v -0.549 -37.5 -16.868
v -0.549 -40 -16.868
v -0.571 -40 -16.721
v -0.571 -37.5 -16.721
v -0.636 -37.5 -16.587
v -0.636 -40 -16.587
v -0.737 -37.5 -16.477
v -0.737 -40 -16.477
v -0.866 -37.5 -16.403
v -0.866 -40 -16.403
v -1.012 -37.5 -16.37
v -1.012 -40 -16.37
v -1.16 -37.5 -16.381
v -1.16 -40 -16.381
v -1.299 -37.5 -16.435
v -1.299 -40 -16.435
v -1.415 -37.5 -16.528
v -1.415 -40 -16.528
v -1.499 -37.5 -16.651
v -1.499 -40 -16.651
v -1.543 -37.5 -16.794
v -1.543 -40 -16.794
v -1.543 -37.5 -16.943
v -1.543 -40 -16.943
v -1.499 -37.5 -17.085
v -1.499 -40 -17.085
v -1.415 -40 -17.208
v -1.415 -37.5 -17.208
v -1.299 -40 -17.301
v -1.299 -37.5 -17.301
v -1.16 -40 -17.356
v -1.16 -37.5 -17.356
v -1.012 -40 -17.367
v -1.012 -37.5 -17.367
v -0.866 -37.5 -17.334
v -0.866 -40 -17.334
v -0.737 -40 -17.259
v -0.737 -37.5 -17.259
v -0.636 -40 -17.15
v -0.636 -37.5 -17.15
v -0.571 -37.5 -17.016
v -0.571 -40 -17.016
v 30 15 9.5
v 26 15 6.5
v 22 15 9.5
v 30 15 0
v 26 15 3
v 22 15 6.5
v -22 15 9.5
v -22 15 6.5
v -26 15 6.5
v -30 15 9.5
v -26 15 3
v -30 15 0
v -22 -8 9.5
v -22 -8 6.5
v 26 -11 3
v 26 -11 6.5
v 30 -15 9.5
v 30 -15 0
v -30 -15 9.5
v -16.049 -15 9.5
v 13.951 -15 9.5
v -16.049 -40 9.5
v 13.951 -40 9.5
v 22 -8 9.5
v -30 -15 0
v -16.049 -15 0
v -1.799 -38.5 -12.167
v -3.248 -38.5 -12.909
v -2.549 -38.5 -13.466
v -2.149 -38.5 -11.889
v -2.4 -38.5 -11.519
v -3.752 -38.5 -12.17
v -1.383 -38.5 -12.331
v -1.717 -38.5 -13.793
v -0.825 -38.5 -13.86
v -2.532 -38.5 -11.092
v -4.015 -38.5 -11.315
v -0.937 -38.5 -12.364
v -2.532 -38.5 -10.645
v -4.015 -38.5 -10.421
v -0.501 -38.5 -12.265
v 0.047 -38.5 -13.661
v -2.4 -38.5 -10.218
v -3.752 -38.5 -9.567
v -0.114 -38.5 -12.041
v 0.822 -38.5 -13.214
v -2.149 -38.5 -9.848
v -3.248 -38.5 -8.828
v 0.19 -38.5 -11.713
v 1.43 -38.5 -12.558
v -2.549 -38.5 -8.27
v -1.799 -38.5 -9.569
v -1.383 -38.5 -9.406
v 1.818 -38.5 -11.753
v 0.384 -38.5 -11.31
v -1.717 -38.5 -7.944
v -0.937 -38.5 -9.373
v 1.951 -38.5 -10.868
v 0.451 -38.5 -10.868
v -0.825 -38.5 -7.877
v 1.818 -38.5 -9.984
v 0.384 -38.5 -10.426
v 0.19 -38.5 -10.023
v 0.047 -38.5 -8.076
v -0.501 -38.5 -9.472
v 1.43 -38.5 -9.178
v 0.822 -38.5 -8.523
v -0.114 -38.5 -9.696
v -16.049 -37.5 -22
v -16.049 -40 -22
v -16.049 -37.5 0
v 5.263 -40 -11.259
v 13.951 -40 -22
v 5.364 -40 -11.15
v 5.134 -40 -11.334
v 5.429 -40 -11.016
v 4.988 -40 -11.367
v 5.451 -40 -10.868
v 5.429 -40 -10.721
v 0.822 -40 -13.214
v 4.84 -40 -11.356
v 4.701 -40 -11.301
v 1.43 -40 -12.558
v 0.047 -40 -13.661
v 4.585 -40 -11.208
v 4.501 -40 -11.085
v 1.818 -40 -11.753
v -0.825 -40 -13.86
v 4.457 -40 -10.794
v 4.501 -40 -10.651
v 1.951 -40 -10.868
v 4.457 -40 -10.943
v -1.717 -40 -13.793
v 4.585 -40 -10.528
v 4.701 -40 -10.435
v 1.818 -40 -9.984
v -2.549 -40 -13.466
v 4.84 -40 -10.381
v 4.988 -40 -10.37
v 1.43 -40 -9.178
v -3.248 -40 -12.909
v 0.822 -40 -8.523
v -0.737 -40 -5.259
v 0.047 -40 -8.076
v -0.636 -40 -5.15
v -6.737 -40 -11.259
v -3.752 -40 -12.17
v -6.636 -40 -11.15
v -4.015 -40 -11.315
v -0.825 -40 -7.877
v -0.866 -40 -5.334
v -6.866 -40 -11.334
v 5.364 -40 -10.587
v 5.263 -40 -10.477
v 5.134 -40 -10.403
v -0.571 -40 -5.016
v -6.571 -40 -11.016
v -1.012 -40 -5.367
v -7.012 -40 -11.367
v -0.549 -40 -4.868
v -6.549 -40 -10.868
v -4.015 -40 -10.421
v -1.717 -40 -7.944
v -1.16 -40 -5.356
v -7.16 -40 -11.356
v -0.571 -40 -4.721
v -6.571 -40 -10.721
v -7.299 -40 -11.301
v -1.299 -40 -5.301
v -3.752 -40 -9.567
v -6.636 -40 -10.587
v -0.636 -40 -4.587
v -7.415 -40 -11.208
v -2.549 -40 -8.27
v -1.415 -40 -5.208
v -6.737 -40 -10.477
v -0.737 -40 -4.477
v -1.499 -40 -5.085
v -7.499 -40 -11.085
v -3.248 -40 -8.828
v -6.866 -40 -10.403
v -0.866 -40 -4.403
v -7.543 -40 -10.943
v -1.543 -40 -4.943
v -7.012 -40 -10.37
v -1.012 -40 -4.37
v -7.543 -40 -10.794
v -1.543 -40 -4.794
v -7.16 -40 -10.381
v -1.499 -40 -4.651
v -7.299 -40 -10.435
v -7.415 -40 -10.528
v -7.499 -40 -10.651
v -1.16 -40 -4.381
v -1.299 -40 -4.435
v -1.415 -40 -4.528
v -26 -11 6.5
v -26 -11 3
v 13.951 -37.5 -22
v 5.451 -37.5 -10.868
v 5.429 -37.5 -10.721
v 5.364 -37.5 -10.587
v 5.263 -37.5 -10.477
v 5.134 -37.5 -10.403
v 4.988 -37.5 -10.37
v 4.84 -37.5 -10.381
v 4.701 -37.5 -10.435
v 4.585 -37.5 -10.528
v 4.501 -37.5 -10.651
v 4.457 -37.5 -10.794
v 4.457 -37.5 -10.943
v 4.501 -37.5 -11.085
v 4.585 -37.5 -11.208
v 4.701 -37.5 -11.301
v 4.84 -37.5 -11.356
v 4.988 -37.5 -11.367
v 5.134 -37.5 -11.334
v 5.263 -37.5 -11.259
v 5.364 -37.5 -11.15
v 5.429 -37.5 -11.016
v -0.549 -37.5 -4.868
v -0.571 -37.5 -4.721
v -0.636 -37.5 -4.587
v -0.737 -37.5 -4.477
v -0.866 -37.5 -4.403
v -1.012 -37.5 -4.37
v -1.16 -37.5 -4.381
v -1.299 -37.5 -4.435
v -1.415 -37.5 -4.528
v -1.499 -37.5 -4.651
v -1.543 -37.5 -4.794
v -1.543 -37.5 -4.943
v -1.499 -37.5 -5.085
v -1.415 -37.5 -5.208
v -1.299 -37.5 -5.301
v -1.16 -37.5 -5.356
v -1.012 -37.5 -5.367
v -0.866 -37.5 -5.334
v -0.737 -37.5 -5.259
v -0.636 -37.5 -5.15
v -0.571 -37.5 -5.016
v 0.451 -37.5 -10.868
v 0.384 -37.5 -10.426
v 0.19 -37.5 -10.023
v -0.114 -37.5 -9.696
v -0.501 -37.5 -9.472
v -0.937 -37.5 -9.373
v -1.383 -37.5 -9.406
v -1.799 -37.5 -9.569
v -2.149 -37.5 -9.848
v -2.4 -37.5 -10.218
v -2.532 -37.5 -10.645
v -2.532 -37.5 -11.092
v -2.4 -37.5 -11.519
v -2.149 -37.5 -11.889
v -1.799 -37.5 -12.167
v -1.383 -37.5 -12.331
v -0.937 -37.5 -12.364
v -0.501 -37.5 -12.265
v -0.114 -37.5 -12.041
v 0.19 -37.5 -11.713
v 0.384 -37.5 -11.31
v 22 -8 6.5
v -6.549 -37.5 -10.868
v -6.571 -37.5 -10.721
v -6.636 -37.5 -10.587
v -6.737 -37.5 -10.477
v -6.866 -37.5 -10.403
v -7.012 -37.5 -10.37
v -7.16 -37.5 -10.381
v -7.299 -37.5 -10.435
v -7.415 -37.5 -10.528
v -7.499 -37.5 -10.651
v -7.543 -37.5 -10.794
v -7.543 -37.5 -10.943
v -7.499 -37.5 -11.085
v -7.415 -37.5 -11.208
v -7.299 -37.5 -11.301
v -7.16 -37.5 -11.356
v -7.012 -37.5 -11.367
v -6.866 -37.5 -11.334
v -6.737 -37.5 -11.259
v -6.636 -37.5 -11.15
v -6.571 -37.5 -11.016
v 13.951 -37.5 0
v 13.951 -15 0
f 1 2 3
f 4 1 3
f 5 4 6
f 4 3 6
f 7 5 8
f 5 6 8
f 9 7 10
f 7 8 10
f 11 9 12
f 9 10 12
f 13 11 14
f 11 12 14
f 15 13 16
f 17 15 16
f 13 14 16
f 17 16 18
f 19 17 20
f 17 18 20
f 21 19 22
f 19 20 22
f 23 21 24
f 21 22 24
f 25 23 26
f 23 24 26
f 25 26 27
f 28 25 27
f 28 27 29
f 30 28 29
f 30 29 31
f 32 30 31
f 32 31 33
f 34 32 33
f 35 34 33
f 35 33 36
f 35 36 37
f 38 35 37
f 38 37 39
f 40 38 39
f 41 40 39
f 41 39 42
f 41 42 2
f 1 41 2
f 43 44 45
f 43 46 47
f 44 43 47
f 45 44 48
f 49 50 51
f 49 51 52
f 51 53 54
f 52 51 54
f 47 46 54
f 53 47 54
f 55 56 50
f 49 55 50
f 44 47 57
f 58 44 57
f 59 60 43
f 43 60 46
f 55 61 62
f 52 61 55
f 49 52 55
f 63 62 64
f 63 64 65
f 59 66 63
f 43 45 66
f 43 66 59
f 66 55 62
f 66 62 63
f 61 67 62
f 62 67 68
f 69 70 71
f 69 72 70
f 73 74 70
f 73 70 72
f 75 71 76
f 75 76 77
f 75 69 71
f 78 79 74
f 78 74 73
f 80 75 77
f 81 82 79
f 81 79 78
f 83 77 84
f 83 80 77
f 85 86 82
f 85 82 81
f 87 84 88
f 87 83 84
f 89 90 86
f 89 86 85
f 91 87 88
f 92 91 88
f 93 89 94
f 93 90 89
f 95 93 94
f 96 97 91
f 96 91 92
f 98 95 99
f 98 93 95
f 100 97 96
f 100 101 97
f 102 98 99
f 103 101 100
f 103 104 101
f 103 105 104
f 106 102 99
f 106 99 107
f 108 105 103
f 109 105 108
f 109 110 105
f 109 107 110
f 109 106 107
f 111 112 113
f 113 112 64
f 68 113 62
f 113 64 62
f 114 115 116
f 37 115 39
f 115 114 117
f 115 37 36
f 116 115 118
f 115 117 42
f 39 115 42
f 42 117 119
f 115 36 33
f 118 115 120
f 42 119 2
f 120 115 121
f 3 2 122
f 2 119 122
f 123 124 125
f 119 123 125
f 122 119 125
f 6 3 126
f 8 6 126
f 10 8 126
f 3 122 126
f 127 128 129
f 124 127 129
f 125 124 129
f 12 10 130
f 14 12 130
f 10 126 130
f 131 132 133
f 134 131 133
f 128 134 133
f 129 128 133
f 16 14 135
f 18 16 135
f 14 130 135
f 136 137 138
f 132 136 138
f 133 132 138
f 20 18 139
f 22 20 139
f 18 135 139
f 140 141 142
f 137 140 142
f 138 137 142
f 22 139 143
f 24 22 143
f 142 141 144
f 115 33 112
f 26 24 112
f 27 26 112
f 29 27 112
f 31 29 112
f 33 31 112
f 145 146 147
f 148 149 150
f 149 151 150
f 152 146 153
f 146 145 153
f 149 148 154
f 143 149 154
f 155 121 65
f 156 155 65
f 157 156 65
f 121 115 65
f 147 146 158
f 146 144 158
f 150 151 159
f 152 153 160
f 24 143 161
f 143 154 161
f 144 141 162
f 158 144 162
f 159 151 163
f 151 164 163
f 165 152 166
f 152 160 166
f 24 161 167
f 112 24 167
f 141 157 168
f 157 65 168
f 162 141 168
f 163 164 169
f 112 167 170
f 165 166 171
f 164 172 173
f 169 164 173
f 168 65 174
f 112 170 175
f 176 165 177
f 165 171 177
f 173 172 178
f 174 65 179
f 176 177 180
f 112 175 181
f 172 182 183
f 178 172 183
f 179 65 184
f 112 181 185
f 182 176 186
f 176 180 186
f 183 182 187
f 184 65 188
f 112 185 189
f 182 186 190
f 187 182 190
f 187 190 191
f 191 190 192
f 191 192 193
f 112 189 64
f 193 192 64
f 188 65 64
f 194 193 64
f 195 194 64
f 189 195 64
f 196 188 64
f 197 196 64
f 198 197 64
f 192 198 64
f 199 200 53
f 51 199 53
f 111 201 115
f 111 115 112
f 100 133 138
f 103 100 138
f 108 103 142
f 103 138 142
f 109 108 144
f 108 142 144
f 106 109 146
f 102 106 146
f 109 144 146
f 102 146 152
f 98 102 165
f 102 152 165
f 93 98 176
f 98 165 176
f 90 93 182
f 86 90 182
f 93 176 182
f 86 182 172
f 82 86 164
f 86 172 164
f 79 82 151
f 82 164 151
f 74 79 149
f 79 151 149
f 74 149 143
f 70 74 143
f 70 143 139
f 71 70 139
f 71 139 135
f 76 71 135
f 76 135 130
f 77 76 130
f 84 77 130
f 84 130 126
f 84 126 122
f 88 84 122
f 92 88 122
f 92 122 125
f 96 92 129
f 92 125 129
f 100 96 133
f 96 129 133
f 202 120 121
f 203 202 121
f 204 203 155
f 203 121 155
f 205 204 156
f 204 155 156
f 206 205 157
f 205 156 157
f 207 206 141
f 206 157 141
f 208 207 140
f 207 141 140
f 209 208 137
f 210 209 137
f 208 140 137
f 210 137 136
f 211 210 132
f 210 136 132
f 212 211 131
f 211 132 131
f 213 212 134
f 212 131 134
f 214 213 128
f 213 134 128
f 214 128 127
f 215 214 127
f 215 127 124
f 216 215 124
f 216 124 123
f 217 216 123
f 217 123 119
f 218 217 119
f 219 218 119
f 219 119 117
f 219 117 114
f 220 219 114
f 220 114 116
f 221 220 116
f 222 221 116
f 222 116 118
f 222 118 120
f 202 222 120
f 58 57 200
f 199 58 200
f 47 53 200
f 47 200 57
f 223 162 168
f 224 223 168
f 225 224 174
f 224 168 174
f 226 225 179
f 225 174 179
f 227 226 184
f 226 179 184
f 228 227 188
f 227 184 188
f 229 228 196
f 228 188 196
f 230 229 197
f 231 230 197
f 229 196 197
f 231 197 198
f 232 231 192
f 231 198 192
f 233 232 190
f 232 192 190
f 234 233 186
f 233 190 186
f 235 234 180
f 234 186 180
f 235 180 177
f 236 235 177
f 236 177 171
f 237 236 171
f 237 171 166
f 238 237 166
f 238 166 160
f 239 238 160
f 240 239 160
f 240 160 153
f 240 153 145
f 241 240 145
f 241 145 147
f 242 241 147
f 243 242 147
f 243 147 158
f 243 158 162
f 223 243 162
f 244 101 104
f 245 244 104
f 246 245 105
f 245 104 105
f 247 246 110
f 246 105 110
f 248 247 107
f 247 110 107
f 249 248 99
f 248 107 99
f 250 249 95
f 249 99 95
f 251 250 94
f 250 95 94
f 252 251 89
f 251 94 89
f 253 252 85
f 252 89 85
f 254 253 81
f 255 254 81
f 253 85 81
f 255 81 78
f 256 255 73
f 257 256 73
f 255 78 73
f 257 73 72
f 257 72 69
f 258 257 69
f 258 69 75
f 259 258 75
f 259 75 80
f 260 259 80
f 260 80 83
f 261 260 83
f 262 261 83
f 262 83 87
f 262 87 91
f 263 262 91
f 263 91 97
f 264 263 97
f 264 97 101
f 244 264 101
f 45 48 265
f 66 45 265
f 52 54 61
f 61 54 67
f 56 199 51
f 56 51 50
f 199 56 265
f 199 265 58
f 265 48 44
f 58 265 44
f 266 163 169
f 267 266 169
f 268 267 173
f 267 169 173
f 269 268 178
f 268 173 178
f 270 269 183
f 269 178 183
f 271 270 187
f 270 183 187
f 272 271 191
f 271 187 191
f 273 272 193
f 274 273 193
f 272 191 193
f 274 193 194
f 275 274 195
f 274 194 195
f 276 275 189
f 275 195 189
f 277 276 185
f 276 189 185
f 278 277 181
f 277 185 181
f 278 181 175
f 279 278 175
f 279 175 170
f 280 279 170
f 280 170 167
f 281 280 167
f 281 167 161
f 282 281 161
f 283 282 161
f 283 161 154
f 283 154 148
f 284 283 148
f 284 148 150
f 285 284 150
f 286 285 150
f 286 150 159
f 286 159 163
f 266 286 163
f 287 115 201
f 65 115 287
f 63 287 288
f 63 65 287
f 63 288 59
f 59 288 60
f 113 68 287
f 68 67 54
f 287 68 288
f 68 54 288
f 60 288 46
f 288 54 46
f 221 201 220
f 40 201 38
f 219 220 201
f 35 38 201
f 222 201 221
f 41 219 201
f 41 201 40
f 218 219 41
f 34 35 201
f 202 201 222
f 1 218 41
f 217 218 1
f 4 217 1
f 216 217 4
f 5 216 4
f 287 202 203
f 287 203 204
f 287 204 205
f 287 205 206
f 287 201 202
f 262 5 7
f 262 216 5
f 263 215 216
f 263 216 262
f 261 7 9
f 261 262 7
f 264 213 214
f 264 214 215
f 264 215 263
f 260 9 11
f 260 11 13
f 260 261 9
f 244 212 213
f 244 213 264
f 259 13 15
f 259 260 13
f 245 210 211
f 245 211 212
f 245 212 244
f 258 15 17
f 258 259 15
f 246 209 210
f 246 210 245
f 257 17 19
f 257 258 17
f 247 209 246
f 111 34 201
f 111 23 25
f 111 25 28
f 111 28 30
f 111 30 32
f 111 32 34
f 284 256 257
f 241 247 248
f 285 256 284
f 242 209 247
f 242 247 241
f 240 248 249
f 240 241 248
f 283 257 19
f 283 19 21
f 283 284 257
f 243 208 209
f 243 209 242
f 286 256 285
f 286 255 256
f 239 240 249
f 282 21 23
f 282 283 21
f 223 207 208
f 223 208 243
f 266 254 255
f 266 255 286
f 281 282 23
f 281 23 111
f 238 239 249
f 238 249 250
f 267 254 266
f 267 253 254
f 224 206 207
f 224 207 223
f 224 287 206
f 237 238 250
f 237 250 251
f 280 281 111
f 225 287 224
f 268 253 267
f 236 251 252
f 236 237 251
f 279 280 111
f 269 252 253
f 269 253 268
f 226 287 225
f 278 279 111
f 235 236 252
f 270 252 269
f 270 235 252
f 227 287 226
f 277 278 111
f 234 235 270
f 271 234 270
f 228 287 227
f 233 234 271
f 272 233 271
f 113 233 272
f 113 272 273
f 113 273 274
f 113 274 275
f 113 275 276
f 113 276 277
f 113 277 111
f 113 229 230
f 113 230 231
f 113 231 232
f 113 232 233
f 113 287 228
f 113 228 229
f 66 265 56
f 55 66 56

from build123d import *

# Parameters (mm, degrees)
ESQUISSE1_W             = 60
ESQUISSE1_H             = 30
ESQUISSE1_W_2           = 30
ESQUISSE1_H_2           = 25
BOSS_EXTRU_1_DEPTH      = 3
ESQUISSE2_W             = 30
ESQUISSE2_H             = 25
BOSS_EXTRU_2_DEPTH      = 3.5
ESQUISSE3_W             = 30
ESQUISSE3_H             = 25
BOSS_EXTRU_3_DEPTH      = 3
ESQUISSE4_W             = 30
ESQUISSE4_H             = 2.5
BOSS_EXTRU_4_DEPTH      = 22
ESQUISSE6_R             = 3
ENL_V_MAT_EXTRU_1_DEPTH = 1.5
ESQUISSE7_R             = 1.5
ENL_V_MAT_EXTRU_2_DEPTH = 6
ESQUISSE8_R             = 0.5
ENL_V_MAT_EXTRU_3_DEPTH = 10


with BuildPart() as part:
    # Esquisse1 → Boss.-Extru.1 (new body)
    with BuildSketch(Plane.XY):
        Rectangle(ESQUISSE1_W, ESQUISSE1_H)
        with Locations((-1.048951049, -27.5)):
            Rectangle(ESQUISSE1_W_2, ESQUISSE1_H_2)
    extrude(amount=BOSS_EXTRU_1_DEPTH)

    # Esquisse2 → Boss.-Extru.2 (add)
    with BuildSketch(Plane.XY.offset(3)):
        Polygon((-26, 15), (-30, 15), (-30, -15), (-26, -15), (-26, -11), align=None)
        Polygon((26, -11), (-26, -11), (-26, -15), (-16.048951049, -15), (13.951048951, -15), (26, -15), align=None)
        Polygon((26, 15), (26, -11), (26, -15), (30, -15), (30, 15), align=None)
        with Locations((-1.048951049, -27.5)):
            Rectangle(ESQUISSE2_W, ESQUISSE2_H)
    extrude(amount=BOSS_EXTRU_2_DEPTH)

    # Esquisse3 → Boss.-Extru.3 (add)
    with BuildSketch(Plane.XY.offset(6.5)):
        Polygon((-22, 15), (-30, 15), (-30, -15), (-22, -15), (-22, -8), align=None)
        Polygon((22, -8), (-22, -8), (-22, -15), (-16.048951049, -15), (13.951048951, -15), (22, -15), align=None)
        Polygon((22, 15), (22, -8), (22, -15), (30, -15), (30, 15), align=None)
        with Locations((-1.048951049, -27.5)):
            Rectangle(ESQUISSE3_W, ESQUISSE3_H)
    extrude(amount=BOSS_EXTRU_3_DEPTH)

    # Esquisse4 → Boss.-Extru.4 (add)
    with BuildSketch(Plane(origin=(0, 0, 0), x_dir=(-1, 0, 0), z_dir=(0, 0, -1))):
        with Locations((1.048951049, -38.75)):
            Rectangle(ESQUISSE4_W, ESQUISSE4_H)
    extrude(amount=BOSS_EXTRU_4_DEPTH)

    # Esquisse6 → Enlèv. mat.-Extru.1 (cut)
    with BuildSketch(Plane.XZ.offset(40)):
        with Locations((-1.048951049, -10.86835965)):
            Circle(ESQUISSE6_R)
    extrude(amount=-ENL_V_MAT_EXTRU_1_DEPTH, mode=Mode.SUBTRACT)

    # Esquisse7 → Enlèv. mat.-Extru.2 (cut)
    with BuildSketch(Plane.XZ.offset(38.5)):
        with Locations((-1.048951049, -10.86835965)):
            Circle(ESQUISSE7_R)
    extrude(amount=-ENL_V_MAT_EXTRU_2_DEPTH, mode=Mode.SUBTRACT)

    # Esquisse8 → Enlèv. mat.-Extru.3 (cut)
    with BuildSketch(Plane.XZ.offset(40)):
        with Locations((-1.048951049, -4.86835965)):
            Circle(ESQUISSE8_R)
        with Locations((-1.048951049, -16.86835965)):
            Circle(ESQUISSE8_R)
        with Locations((4.951048951, -10.86835965)):
            Circle(ESQUISSE8_R)
        with Locations((-7.048951049, -10.86835965)):
            Circle(ESQUISSE8_R)
    extrude(amount=-ENL_V_MAT_EXTRU_3_DEPTH, mode=Mode.SUBTRACT)


solid = part.part
